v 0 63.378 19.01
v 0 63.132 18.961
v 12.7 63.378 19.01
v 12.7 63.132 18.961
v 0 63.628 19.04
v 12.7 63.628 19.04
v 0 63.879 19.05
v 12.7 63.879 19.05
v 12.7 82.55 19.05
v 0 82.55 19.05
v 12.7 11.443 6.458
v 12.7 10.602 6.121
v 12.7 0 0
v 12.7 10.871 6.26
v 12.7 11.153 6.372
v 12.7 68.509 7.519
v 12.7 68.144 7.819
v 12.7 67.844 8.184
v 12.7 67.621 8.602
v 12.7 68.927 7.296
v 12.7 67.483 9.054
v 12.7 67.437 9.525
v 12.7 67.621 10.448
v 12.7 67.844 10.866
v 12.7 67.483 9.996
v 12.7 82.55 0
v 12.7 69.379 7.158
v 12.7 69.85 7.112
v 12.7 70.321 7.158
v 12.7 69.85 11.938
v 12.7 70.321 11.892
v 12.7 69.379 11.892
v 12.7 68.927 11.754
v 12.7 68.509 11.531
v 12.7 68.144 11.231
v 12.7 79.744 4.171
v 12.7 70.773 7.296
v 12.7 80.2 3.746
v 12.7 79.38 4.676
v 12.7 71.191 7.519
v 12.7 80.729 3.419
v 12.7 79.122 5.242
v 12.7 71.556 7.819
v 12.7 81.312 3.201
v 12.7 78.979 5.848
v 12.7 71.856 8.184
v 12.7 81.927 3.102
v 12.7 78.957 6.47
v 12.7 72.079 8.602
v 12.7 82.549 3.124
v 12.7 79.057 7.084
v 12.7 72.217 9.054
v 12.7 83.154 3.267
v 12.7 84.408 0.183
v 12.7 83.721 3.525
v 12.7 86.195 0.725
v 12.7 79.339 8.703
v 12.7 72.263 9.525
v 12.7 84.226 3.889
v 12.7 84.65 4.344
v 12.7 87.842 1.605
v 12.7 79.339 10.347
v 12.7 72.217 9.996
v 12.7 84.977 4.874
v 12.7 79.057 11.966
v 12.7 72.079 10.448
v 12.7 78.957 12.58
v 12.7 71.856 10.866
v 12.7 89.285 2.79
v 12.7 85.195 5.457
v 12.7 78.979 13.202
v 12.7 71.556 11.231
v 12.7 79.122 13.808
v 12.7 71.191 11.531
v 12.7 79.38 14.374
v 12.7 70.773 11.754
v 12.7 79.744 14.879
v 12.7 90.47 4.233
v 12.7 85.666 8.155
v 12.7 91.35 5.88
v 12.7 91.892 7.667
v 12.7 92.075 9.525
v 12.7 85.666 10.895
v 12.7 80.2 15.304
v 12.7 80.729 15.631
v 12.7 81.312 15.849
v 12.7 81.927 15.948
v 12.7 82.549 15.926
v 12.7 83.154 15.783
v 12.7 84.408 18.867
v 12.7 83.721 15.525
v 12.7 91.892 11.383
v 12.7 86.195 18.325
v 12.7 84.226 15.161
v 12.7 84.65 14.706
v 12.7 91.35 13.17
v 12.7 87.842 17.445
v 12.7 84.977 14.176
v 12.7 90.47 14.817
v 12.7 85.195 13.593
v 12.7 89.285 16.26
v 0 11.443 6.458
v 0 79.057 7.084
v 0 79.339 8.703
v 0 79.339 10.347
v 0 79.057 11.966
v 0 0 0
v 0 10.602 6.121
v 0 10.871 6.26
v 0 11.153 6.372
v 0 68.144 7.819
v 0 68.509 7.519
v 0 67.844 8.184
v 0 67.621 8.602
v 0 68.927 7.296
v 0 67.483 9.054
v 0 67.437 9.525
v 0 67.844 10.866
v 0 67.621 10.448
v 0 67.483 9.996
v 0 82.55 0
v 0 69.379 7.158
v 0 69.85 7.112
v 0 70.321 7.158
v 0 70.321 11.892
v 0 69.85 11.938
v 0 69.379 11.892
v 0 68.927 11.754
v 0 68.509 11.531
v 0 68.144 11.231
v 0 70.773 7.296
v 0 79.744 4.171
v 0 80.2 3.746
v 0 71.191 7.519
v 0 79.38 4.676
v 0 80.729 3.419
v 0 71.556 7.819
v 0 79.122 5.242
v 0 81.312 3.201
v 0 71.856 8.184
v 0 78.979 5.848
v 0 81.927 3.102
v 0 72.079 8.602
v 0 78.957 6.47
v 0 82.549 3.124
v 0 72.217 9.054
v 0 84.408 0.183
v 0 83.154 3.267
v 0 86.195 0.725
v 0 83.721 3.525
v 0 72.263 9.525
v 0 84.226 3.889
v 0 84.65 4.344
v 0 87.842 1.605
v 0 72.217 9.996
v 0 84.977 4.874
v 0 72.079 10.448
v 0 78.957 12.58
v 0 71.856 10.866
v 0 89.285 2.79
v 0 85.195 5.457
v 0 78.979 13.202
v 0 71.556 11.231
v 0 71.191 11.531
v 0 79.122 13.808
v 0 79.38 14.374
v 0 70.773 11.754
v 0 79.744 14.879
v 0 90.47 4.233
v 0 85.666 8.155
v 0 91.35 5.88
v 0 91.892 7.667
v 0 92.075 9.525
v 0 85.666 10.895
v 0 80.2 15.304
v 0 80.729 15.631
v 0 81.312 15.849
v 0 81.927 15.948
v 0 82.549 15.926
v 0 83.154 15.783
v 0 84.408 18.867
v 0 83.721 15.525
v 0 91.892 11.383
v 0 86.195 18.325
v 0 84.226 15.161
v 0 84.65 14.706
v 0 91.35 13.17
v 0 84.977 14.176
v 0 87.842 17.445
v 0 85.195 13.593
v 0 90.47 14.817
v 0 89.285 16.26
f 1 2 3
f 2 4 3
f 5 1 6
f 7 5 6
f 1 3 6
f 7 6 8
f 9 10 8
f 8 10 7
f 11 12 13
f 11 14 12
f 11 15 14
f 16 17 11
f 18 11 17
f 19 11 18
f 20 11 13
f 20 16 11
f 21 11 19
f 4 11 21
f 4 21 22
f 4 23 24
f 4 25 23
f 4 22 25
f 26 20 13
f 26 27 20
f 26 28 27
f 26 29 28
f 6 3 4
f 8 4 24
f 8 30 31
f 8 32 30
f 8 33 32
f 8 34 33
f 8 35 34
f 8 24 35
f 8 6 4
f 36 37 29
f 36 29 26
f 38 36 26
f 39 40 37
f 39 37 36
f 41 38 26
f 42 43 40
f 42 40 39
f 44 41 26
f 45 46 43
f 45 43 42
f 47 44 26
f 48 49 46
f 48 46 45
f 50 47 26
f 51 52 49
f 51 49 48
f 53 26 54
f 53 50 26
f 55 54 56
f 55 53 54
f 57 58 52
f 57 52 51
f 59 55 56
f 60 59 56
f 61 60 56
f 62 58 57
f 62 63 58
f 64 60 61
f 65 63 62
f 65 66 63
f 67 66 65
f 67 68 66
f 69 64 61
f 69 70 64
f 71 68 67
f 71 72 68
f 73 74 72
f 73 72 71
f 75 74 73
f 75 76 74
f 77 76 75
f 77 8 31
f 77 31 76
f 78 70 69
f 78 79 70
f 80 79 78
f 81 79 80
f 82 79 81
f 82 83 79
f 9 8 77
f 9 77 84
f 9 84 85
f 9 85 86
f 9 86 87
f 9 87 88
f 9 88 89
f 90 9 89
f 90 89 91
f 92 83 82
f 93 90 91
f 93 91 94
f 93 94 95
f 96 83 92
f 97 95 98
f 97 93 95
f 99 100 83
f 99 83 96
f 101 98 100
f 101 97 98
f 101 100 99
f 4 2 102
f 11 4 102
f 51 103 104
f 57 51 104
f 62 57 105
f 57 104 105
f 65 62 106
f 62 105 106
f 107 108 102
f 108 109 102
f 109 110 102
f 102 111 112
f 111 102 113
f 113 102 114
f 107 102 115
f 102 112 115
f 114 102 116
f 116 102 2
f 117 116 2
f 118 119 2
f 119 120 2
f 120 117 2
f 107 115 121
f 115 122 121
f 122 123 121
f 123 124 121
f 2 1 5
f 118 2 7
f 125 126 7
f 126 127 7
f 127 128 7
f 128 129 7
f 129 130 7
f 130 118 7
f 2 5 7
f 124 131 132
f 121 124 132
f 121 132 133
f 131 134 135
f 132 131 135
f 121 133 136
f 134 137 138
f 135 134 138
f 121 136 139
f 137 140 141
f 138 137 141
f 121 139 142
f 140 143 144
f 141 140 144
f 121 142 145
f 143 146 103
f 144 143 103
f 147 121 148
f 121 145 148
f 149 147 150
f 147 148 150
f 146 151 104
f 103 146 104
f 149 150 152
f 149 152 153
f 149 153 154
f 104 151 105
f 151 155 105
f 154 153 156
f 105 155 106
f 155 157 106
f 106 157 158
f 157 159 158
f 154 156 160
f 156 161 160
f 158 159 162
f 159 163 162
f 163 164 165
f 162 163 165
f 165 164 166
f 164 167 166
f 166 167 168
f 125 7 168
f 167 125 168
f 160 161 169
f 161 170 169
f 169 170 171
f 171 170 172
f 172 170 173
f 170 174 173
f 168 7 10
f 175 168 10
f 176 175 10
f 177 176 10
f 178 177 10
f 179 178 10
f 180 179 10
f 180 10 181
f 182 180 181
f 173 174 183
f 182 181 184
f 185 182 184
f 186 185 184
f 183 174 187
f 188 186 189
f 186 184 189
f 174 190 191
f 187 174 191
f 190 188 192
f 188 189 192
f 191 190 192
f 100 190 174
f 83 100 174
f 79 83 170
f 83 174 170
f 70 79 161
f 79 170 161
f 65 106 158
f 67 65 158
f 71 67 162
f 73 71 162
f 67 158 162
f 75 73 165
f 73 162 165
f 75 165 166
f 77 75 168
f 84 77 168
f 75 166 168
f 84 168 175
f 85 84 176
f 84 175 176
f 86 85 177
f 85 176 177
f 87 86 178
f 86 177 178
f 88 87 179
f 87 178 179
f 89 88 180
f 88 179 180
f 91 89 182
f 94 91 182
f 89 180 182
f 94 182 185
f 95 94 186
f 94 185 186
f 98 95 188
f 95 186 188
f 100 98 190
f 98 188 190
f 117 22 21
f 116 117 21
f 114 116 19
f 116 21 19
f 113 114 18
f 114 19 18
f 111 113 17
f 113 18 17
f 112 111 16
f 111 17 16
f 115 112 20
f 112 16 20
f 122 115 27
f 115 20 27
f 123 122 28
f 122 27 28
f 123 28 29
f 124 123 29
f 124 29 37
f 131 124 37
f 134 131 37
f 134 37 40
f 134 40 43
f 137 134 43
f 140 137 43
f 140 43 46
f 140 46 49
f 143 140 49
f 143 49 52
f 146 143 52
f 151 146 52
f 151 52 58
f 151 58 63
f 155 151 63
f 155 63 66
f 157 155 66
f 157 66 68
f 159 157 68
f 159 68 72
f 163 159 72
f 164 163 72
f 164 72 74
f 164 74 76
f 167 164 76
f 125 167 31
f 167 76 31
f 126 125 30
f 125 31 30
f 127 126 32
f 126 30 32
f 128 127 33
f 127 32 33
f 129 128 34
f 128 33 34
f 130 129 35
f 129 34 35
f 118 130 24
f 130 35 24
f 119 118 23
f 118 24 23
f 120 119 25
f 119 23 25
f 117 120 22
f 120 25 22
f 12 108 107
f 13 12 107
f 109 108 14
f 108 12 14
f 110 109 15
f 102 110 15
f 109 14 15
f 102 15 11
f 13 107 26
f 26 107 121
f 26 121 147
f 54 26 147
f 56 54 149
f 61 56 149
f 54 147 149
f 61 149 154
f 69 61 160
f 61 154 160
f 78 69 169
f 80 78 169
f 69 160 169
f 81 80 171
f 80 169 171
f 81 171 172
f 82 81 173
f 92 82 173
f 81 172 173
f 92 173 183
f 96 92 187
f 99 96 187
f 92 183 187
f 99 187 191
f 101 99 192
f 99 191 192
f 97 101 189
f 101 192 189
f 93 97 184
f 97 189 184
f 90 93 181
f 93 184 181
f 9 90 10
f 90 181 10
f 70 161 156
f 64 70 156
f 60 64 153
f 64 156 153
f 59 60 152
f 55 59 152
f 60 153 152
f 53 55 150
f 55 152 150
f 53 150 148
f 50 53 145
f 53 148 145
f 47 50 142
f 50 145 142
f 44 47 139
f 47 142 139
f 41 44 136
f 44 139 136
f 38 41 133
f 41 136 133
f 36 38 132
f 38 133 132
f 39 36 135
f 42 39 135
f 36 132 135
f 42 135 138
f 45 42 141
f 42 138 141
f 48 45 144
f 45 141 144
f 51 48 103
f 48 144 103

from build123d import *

# Parameters (mm, degrees)
F1_DEPTH = 12.7
F2_D     = 4.826
F3_R     = 3.175


with BuildPart() as f1:
    # F0 (on Right) → F1 (new body)
    with BuildSketch(Plane.YZ):
        with BuildLine():
            Line((10.9985226281, 6.35), (0, 0))
            Line((0, 0), (82.55, 0))
            ThreePointArc((82.55, 0), (92.075, 9.525), (82.55, 19.05))
            Line((82.55, 19.05), (63.5, 19.05))
            Line((63.5, 19.05), (10.9985226281, 6.35))
        make_face()
        with BuildLine():
            ThreePointArc((79.0569245722, 11.9659352556), (81.3122543444, 15.8485551982), (85.194874287, 13.5932254261))
            ThreePointArc((85.194874287, 13.5932254261), (85.725, 9.525), (85.194874287, 5.4567745739))
            ThreePointArc((85.194874287, 5.4567745739), (81.3122543444, 3.2014448018), (79.0569245722, 7.0840647444))
            ThreePointArc((79.0569245722, 7.0840647444), (79.375, 9.525), (79.0569245722, 11.9659352556))
        make_face(mode=Mode.SUBTRACT)
    extrude(amount=F1_DEPTH)

    # F2 (through all)
    with Locations(Plane(origin=(0, 0, 0), x_dir=(0, 1, 0), z_dir=(-1, 0, 0))):
        with Locations((69.85, -9.525), (82.4664258806, -8.070421711)):
            Hole(F2_D / 2)

    # F3
    f3_edges = [f1.edges().sort_by_distance(p)[0] for p in [
        (6.35, 63.5, 19.05),
        (6.35, 10.998523, 6.35),
    ]]
    fillet(f3_edges, radius=F3_R)


solid = f1.part
